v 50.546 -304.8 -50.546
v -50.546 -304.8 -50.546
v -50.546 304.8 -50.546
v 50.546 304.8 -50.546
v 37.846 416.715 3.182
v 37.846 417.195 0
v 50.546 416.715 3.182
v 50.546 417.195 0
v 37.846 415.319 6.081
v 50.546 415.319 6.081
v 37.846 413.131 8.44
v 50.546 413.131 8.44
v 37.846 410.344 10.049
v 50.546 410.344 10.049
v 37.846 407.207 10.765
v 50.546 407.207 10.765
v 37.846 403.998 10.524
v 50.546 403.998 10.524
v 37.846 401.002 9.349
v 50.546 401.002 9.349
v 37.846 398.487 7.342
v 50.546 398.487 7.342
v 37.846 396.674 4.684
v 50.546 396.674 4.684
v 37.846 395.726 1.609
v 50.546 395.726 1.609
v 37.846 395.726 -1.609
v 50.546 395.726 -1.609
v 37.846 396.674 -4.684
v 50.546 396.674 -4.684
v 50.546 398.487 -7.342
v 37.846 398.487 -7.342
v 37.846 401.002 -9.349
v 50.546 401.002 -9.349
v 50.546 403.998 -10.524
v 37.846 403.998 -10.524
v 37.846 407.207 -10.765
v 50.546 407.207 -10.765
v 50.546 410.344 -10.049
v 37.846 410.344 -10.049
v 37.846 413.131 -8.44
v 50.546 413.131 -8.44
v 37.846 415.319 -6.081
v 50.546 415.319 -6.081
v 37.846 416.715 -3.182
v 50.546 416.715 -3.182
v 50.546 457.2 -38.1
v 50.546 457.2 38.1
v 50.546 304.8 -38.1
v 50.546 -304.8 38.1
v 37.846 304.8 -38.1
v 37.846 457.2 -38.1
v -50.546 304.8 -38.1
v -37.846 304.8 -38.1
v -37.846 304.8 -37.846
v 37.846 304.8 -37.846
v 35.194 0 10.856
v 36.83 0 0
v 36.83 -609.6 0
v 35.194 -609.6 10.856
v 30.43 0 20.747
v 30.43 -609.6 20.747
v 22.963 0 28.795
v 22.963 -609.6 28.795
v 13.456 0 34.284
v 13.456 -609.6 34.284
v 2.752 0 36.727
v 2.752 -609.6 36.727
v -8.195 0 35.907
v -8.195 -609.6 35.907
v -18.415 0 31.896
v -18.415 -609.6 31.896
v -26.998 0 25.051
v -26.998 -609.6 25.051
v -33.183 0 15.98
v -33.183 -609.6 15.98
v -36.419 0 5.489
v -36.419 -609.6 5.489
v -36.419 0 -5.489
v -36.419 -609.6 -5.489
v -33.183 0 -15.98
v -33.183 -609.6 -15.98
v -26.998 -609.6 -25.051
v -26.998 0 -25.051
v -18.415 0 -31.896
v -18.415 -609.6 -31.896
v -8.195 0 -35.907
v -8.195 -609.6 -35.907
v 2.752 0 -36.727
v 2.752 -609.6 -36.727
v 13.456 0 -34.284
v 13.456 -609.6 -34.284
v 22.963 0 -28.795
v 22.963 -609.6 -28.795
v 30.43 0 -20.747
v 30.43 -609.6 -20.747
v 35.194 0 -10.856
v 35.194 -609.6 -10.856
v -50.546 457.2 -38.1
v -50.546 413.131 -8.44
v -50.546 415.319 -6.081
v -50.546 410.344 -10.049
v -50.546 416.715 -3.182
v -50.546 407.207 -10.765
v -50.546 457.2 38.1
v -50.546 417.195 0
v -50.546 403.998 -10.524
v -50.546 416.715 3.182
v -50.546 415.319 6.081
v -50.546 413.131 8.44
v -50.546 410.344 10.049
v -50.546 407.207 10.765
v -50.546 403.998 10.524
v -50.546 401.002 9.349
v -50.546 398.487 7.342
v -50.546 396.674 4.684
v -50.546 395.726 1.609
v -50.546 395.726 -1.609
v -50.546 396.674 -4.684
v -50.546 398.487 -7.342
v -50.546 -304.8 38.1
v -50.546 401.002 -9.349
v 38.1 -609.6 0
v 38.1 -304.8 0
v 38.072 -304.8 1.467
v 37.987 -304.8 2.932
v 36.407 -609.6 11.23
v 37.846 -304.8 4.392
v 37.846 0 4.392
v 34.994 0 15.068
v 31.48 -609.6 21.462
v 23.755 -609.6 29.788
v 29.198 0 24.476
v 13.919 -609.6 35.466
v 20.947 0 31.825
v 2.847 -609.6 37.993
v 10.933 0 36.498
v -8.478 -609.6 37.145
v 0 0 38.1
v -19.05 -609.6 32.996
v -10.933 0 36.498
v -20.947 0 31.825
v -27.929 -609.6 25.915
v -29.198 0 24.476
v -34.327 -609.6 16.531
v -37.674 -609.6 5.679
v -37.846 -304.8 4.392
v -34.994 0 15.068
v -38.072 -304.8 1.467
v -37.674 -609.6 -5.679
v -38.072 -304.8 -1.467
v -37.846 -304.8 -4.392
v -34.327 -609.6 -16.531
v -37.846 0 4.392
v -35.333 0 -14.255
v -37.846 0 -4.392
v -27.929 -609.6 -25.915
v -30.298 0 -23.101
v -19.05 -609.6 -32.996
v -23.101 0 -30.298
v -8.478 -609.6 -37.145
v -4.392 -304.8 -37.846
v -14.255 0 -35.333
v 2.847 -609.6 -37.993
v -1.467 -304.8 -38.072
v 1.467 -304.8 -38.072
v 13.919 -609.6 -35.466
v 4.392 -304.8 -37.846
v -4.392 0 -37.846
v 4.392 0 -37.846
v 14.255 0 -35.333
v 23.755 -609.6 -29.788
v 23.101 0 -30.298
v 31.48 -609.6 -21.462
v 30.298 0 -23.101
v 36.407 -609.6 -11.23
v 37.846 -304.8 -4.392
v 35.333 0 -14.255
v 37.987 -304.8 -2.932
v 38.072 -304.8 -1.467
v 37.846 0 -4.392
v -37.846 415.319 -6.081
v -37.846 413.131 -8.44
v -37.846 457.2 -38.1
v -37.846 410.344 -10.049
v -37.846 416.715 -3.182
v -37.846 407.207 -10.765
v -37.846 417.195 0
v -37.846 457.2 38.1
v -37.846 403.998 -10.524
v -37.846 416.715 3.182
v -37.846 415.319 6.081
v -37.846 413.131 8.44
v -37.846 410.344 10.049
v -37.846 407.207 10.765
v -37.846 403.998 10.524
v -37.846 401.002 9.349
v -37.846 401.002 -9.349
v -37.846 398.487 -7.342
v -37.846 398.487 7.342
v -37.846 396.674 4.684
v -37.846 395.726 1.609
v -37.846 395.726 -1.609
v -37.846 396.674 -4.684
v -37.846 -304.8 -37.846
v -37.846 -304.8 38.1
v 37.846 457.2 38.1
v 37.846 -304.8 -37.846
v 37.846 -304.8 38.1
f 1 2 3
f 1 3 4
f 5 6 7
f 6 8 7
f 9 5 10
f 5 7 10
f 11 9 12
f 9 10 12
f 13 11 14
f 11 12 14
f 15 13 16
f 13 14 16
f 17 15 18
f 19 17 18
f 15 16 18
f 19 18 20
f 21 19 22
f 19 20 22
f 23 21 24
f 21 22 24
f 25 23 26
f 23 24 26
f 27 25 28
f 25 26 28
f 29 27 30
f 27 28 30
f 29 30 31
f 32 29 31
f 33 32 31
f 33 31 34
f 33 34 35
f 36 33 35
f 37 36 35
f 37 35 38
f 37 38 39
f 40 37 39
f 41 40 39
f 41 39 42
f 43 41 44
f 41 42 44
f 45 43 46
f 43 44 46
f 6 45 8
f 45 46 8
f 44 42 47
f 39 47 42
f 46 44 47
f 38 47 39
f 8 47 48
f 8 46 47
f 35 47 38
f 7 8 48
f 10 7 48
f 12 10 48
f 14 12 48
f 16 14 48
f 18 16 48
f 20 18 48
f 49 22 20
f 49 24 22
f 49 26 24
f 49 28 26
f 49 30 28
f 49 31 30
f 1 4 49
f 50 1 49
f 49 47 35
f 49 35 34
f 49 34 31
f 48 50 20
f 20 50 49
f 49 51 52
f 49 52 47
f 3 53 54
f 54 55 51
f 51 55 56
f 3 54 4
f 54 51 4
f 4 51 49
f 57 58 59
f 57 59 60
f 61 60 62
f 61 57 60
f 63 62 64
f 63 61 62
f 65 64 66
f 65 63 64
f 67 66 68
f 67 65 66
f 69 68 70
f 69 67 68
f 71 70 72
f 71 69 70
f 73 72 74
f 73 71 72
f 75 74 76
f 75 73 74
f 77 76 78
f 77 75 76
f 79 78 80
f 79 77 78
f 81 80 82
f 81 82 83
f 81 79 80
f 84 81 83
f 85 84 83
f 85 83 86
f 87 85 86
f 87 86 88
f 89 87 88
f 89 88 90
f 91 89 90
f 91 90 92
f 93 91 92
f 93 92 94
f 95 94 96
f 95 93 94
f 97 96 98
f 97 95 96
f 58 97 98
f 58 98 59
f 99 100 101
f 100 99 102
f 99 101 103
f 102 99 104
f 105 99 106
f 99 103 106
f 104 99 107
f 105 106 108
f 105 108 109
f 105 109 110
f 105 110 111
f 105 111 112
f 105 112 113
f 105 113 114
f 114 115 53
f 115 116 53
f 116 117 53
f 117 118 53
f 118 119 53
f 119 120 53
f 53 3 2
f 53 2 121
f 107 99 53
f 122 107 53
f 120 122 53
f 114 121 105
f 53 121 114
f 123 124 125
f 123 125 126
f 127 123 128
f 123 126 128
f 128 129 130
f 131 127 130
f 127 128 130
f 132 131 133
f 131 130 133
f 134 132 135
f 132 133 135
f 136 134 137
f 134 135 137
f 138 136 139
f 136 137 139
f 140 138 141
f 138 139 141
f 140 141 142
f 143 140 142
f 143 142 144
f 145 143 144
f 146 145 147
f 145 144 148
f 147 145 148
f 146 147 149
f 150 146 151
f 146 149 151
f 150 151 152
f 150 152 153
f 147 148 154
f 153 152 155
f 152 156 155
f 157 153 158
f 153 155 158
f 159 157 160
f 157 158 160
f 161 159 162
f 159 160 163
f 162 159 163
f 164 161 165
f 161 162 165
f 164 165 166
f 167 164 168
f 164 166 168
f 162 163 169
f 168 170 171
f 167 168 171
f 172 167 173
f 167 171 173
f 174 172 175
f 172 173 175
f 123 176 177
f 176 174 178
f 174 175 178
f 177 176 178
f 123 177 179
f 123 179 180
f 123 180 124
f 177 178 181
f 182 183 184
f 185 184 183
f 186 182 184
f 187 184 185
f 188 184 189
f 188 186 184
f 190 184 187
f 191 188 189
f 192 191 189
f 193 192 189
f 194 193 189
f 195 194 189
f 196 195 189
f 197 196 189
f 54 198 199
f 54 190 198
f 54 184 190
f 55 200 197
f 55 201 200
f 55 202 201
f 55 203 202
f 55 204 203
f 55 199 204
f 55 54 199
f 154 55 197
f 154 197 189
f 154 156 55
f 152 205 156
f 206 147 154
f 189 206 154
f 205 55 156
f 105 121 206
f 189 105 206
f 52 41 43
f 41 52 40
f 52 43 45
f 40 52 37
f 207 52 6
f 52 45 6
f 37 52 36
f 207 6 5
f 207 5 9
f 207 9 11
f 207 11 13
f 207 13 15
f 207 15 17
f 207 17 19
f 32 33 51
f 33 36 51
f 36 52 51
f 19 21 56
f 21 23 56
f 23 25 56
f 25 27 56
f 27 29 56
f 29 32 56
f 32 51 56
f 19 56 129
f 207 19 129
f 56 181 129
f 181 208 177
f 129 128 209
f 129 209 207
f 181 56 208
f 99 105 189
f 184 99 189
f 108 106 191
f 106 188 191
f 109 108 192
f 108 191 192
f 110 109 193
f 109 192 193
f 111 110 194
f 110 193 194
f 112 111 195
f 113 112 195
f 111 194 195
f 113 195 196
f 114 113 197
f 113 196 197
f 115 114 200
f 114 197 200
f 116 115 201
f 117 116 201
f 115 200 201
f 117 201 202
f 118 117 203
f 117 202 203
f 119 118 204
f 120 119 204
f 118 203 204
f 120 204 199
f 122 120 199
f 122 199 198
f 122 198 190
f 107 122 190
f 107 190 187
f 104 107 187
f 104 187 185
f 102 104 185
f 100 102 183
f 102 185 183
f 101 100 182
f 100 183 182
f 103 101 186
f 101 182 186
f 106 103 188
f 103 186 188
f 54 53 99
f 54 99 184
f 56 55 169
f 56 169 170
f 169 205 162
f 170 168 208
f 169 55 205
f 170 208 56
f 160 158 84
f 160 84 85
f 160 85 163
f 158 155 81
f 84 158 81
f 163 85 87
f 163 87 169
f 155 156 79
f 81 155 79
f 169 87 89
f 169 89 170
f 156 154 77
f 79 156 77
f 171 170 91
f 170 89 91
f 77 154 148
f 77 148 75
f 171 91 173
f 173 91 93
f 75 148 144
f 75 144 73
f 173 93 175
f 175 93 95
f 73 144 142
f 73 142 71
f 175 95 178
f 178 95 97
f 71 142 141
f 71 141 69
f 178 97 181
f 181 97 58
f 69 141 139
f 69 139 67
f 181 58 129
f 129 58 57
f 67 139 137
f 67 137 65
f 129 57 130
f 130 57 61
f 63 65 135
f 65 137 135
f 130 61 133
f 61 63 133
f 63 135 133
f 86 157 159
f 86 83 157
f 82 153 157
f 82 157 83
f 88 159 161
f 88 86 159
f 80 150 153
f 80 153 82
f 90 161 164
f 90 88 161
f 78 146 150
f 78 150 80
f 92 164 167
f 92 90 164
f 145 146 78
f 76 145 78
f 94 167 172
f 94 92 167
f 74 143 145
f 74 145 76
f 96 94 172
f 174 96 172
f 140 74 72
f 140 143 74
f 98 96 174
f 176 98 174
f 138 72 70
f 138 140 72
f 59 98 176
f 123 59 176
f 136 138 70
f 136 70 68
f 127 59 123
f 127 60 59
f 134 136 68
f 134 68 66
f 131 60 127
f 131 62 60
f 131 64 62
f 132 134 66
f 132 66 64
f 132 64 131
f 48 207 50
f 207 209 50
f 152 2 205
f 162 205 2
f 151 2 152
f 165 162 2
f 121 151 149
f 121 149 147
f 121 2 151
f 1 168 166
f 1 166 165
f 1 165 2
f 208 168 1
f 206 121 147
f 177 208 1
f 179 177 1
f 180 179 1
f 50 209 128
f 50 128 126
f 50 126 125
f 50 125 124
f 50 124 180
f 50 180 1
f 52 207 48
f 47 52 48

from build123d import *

# Parameters (mm, degrees)
F0_R     = 38.1
F0_R_2   = 36.83
F1_DEPTH = 609.6
F2_W     = 12.7
F2_H     = 76.2
F3_DEPTH = 304.8
F4_DEPTH = 457.2
F5_W     = 101.092
F5_H     = 12.7
F6_DEPTH = 304.8
F7_DEPTH = 304.8
F8_R     = 10.795
F9_DEPTH = 50.8


with BuildPart() as f1:
    # F0 (on Front) → F1 (new body)
    with BuildSketch(Plane.XZ):
        Circle(F0_R)
        Circle(F0_R_2, mode=Mode.SUBTRACT)
    extrude(amount=F1_DEPTH)

    # F2 (on Front) → F3 (join)
    with BuildSketch(Plane.XZ):
        with Locations((44.196, 0)):
            Rectangle(F2_W, F2_H)
        with Locations((-44.196, 0)):
            Rectangle(F2_W, F2_H)
    extrude(amount=F3_DEPTH)

    # F2 (on Front) → F4 (join)
    with BuildSketch(Plane.XZ):
        with Locations((44.196, 0)):
            Rectangle(F2_W, F2_H)
        with Locations((-44.196, 0)):
            Rectangle(F2_W, F2_H)
    extrude(amount=-F4_DEPTH)

    # F5 (on Front) → F6 (join)
    with BuildSketch(Plane.XZ):
        with Locations((0, -44.196)):
            Rectangle(F5_W, F5_H)
    extrude(amount=F6_DEPTH)

    # F5 (on Front) → F7 (join)
    with BuildSketch(Plane.XZ):
        with Locations((0, -44.196)):
            Rectangle(F5_W, F5_H)
    extrude(amount=-F7_DEPTH)

    # F8 (on Right) → F9 (cut, symmetric)
    with BuildSketch(Plane.YZ):
        with Locations((406.4, 0)):
            Circle(F8_R)
    extrude(amount=F9_DEPTH, both=True, mode=Mode.SUBTRACT)


solid = f1.part
